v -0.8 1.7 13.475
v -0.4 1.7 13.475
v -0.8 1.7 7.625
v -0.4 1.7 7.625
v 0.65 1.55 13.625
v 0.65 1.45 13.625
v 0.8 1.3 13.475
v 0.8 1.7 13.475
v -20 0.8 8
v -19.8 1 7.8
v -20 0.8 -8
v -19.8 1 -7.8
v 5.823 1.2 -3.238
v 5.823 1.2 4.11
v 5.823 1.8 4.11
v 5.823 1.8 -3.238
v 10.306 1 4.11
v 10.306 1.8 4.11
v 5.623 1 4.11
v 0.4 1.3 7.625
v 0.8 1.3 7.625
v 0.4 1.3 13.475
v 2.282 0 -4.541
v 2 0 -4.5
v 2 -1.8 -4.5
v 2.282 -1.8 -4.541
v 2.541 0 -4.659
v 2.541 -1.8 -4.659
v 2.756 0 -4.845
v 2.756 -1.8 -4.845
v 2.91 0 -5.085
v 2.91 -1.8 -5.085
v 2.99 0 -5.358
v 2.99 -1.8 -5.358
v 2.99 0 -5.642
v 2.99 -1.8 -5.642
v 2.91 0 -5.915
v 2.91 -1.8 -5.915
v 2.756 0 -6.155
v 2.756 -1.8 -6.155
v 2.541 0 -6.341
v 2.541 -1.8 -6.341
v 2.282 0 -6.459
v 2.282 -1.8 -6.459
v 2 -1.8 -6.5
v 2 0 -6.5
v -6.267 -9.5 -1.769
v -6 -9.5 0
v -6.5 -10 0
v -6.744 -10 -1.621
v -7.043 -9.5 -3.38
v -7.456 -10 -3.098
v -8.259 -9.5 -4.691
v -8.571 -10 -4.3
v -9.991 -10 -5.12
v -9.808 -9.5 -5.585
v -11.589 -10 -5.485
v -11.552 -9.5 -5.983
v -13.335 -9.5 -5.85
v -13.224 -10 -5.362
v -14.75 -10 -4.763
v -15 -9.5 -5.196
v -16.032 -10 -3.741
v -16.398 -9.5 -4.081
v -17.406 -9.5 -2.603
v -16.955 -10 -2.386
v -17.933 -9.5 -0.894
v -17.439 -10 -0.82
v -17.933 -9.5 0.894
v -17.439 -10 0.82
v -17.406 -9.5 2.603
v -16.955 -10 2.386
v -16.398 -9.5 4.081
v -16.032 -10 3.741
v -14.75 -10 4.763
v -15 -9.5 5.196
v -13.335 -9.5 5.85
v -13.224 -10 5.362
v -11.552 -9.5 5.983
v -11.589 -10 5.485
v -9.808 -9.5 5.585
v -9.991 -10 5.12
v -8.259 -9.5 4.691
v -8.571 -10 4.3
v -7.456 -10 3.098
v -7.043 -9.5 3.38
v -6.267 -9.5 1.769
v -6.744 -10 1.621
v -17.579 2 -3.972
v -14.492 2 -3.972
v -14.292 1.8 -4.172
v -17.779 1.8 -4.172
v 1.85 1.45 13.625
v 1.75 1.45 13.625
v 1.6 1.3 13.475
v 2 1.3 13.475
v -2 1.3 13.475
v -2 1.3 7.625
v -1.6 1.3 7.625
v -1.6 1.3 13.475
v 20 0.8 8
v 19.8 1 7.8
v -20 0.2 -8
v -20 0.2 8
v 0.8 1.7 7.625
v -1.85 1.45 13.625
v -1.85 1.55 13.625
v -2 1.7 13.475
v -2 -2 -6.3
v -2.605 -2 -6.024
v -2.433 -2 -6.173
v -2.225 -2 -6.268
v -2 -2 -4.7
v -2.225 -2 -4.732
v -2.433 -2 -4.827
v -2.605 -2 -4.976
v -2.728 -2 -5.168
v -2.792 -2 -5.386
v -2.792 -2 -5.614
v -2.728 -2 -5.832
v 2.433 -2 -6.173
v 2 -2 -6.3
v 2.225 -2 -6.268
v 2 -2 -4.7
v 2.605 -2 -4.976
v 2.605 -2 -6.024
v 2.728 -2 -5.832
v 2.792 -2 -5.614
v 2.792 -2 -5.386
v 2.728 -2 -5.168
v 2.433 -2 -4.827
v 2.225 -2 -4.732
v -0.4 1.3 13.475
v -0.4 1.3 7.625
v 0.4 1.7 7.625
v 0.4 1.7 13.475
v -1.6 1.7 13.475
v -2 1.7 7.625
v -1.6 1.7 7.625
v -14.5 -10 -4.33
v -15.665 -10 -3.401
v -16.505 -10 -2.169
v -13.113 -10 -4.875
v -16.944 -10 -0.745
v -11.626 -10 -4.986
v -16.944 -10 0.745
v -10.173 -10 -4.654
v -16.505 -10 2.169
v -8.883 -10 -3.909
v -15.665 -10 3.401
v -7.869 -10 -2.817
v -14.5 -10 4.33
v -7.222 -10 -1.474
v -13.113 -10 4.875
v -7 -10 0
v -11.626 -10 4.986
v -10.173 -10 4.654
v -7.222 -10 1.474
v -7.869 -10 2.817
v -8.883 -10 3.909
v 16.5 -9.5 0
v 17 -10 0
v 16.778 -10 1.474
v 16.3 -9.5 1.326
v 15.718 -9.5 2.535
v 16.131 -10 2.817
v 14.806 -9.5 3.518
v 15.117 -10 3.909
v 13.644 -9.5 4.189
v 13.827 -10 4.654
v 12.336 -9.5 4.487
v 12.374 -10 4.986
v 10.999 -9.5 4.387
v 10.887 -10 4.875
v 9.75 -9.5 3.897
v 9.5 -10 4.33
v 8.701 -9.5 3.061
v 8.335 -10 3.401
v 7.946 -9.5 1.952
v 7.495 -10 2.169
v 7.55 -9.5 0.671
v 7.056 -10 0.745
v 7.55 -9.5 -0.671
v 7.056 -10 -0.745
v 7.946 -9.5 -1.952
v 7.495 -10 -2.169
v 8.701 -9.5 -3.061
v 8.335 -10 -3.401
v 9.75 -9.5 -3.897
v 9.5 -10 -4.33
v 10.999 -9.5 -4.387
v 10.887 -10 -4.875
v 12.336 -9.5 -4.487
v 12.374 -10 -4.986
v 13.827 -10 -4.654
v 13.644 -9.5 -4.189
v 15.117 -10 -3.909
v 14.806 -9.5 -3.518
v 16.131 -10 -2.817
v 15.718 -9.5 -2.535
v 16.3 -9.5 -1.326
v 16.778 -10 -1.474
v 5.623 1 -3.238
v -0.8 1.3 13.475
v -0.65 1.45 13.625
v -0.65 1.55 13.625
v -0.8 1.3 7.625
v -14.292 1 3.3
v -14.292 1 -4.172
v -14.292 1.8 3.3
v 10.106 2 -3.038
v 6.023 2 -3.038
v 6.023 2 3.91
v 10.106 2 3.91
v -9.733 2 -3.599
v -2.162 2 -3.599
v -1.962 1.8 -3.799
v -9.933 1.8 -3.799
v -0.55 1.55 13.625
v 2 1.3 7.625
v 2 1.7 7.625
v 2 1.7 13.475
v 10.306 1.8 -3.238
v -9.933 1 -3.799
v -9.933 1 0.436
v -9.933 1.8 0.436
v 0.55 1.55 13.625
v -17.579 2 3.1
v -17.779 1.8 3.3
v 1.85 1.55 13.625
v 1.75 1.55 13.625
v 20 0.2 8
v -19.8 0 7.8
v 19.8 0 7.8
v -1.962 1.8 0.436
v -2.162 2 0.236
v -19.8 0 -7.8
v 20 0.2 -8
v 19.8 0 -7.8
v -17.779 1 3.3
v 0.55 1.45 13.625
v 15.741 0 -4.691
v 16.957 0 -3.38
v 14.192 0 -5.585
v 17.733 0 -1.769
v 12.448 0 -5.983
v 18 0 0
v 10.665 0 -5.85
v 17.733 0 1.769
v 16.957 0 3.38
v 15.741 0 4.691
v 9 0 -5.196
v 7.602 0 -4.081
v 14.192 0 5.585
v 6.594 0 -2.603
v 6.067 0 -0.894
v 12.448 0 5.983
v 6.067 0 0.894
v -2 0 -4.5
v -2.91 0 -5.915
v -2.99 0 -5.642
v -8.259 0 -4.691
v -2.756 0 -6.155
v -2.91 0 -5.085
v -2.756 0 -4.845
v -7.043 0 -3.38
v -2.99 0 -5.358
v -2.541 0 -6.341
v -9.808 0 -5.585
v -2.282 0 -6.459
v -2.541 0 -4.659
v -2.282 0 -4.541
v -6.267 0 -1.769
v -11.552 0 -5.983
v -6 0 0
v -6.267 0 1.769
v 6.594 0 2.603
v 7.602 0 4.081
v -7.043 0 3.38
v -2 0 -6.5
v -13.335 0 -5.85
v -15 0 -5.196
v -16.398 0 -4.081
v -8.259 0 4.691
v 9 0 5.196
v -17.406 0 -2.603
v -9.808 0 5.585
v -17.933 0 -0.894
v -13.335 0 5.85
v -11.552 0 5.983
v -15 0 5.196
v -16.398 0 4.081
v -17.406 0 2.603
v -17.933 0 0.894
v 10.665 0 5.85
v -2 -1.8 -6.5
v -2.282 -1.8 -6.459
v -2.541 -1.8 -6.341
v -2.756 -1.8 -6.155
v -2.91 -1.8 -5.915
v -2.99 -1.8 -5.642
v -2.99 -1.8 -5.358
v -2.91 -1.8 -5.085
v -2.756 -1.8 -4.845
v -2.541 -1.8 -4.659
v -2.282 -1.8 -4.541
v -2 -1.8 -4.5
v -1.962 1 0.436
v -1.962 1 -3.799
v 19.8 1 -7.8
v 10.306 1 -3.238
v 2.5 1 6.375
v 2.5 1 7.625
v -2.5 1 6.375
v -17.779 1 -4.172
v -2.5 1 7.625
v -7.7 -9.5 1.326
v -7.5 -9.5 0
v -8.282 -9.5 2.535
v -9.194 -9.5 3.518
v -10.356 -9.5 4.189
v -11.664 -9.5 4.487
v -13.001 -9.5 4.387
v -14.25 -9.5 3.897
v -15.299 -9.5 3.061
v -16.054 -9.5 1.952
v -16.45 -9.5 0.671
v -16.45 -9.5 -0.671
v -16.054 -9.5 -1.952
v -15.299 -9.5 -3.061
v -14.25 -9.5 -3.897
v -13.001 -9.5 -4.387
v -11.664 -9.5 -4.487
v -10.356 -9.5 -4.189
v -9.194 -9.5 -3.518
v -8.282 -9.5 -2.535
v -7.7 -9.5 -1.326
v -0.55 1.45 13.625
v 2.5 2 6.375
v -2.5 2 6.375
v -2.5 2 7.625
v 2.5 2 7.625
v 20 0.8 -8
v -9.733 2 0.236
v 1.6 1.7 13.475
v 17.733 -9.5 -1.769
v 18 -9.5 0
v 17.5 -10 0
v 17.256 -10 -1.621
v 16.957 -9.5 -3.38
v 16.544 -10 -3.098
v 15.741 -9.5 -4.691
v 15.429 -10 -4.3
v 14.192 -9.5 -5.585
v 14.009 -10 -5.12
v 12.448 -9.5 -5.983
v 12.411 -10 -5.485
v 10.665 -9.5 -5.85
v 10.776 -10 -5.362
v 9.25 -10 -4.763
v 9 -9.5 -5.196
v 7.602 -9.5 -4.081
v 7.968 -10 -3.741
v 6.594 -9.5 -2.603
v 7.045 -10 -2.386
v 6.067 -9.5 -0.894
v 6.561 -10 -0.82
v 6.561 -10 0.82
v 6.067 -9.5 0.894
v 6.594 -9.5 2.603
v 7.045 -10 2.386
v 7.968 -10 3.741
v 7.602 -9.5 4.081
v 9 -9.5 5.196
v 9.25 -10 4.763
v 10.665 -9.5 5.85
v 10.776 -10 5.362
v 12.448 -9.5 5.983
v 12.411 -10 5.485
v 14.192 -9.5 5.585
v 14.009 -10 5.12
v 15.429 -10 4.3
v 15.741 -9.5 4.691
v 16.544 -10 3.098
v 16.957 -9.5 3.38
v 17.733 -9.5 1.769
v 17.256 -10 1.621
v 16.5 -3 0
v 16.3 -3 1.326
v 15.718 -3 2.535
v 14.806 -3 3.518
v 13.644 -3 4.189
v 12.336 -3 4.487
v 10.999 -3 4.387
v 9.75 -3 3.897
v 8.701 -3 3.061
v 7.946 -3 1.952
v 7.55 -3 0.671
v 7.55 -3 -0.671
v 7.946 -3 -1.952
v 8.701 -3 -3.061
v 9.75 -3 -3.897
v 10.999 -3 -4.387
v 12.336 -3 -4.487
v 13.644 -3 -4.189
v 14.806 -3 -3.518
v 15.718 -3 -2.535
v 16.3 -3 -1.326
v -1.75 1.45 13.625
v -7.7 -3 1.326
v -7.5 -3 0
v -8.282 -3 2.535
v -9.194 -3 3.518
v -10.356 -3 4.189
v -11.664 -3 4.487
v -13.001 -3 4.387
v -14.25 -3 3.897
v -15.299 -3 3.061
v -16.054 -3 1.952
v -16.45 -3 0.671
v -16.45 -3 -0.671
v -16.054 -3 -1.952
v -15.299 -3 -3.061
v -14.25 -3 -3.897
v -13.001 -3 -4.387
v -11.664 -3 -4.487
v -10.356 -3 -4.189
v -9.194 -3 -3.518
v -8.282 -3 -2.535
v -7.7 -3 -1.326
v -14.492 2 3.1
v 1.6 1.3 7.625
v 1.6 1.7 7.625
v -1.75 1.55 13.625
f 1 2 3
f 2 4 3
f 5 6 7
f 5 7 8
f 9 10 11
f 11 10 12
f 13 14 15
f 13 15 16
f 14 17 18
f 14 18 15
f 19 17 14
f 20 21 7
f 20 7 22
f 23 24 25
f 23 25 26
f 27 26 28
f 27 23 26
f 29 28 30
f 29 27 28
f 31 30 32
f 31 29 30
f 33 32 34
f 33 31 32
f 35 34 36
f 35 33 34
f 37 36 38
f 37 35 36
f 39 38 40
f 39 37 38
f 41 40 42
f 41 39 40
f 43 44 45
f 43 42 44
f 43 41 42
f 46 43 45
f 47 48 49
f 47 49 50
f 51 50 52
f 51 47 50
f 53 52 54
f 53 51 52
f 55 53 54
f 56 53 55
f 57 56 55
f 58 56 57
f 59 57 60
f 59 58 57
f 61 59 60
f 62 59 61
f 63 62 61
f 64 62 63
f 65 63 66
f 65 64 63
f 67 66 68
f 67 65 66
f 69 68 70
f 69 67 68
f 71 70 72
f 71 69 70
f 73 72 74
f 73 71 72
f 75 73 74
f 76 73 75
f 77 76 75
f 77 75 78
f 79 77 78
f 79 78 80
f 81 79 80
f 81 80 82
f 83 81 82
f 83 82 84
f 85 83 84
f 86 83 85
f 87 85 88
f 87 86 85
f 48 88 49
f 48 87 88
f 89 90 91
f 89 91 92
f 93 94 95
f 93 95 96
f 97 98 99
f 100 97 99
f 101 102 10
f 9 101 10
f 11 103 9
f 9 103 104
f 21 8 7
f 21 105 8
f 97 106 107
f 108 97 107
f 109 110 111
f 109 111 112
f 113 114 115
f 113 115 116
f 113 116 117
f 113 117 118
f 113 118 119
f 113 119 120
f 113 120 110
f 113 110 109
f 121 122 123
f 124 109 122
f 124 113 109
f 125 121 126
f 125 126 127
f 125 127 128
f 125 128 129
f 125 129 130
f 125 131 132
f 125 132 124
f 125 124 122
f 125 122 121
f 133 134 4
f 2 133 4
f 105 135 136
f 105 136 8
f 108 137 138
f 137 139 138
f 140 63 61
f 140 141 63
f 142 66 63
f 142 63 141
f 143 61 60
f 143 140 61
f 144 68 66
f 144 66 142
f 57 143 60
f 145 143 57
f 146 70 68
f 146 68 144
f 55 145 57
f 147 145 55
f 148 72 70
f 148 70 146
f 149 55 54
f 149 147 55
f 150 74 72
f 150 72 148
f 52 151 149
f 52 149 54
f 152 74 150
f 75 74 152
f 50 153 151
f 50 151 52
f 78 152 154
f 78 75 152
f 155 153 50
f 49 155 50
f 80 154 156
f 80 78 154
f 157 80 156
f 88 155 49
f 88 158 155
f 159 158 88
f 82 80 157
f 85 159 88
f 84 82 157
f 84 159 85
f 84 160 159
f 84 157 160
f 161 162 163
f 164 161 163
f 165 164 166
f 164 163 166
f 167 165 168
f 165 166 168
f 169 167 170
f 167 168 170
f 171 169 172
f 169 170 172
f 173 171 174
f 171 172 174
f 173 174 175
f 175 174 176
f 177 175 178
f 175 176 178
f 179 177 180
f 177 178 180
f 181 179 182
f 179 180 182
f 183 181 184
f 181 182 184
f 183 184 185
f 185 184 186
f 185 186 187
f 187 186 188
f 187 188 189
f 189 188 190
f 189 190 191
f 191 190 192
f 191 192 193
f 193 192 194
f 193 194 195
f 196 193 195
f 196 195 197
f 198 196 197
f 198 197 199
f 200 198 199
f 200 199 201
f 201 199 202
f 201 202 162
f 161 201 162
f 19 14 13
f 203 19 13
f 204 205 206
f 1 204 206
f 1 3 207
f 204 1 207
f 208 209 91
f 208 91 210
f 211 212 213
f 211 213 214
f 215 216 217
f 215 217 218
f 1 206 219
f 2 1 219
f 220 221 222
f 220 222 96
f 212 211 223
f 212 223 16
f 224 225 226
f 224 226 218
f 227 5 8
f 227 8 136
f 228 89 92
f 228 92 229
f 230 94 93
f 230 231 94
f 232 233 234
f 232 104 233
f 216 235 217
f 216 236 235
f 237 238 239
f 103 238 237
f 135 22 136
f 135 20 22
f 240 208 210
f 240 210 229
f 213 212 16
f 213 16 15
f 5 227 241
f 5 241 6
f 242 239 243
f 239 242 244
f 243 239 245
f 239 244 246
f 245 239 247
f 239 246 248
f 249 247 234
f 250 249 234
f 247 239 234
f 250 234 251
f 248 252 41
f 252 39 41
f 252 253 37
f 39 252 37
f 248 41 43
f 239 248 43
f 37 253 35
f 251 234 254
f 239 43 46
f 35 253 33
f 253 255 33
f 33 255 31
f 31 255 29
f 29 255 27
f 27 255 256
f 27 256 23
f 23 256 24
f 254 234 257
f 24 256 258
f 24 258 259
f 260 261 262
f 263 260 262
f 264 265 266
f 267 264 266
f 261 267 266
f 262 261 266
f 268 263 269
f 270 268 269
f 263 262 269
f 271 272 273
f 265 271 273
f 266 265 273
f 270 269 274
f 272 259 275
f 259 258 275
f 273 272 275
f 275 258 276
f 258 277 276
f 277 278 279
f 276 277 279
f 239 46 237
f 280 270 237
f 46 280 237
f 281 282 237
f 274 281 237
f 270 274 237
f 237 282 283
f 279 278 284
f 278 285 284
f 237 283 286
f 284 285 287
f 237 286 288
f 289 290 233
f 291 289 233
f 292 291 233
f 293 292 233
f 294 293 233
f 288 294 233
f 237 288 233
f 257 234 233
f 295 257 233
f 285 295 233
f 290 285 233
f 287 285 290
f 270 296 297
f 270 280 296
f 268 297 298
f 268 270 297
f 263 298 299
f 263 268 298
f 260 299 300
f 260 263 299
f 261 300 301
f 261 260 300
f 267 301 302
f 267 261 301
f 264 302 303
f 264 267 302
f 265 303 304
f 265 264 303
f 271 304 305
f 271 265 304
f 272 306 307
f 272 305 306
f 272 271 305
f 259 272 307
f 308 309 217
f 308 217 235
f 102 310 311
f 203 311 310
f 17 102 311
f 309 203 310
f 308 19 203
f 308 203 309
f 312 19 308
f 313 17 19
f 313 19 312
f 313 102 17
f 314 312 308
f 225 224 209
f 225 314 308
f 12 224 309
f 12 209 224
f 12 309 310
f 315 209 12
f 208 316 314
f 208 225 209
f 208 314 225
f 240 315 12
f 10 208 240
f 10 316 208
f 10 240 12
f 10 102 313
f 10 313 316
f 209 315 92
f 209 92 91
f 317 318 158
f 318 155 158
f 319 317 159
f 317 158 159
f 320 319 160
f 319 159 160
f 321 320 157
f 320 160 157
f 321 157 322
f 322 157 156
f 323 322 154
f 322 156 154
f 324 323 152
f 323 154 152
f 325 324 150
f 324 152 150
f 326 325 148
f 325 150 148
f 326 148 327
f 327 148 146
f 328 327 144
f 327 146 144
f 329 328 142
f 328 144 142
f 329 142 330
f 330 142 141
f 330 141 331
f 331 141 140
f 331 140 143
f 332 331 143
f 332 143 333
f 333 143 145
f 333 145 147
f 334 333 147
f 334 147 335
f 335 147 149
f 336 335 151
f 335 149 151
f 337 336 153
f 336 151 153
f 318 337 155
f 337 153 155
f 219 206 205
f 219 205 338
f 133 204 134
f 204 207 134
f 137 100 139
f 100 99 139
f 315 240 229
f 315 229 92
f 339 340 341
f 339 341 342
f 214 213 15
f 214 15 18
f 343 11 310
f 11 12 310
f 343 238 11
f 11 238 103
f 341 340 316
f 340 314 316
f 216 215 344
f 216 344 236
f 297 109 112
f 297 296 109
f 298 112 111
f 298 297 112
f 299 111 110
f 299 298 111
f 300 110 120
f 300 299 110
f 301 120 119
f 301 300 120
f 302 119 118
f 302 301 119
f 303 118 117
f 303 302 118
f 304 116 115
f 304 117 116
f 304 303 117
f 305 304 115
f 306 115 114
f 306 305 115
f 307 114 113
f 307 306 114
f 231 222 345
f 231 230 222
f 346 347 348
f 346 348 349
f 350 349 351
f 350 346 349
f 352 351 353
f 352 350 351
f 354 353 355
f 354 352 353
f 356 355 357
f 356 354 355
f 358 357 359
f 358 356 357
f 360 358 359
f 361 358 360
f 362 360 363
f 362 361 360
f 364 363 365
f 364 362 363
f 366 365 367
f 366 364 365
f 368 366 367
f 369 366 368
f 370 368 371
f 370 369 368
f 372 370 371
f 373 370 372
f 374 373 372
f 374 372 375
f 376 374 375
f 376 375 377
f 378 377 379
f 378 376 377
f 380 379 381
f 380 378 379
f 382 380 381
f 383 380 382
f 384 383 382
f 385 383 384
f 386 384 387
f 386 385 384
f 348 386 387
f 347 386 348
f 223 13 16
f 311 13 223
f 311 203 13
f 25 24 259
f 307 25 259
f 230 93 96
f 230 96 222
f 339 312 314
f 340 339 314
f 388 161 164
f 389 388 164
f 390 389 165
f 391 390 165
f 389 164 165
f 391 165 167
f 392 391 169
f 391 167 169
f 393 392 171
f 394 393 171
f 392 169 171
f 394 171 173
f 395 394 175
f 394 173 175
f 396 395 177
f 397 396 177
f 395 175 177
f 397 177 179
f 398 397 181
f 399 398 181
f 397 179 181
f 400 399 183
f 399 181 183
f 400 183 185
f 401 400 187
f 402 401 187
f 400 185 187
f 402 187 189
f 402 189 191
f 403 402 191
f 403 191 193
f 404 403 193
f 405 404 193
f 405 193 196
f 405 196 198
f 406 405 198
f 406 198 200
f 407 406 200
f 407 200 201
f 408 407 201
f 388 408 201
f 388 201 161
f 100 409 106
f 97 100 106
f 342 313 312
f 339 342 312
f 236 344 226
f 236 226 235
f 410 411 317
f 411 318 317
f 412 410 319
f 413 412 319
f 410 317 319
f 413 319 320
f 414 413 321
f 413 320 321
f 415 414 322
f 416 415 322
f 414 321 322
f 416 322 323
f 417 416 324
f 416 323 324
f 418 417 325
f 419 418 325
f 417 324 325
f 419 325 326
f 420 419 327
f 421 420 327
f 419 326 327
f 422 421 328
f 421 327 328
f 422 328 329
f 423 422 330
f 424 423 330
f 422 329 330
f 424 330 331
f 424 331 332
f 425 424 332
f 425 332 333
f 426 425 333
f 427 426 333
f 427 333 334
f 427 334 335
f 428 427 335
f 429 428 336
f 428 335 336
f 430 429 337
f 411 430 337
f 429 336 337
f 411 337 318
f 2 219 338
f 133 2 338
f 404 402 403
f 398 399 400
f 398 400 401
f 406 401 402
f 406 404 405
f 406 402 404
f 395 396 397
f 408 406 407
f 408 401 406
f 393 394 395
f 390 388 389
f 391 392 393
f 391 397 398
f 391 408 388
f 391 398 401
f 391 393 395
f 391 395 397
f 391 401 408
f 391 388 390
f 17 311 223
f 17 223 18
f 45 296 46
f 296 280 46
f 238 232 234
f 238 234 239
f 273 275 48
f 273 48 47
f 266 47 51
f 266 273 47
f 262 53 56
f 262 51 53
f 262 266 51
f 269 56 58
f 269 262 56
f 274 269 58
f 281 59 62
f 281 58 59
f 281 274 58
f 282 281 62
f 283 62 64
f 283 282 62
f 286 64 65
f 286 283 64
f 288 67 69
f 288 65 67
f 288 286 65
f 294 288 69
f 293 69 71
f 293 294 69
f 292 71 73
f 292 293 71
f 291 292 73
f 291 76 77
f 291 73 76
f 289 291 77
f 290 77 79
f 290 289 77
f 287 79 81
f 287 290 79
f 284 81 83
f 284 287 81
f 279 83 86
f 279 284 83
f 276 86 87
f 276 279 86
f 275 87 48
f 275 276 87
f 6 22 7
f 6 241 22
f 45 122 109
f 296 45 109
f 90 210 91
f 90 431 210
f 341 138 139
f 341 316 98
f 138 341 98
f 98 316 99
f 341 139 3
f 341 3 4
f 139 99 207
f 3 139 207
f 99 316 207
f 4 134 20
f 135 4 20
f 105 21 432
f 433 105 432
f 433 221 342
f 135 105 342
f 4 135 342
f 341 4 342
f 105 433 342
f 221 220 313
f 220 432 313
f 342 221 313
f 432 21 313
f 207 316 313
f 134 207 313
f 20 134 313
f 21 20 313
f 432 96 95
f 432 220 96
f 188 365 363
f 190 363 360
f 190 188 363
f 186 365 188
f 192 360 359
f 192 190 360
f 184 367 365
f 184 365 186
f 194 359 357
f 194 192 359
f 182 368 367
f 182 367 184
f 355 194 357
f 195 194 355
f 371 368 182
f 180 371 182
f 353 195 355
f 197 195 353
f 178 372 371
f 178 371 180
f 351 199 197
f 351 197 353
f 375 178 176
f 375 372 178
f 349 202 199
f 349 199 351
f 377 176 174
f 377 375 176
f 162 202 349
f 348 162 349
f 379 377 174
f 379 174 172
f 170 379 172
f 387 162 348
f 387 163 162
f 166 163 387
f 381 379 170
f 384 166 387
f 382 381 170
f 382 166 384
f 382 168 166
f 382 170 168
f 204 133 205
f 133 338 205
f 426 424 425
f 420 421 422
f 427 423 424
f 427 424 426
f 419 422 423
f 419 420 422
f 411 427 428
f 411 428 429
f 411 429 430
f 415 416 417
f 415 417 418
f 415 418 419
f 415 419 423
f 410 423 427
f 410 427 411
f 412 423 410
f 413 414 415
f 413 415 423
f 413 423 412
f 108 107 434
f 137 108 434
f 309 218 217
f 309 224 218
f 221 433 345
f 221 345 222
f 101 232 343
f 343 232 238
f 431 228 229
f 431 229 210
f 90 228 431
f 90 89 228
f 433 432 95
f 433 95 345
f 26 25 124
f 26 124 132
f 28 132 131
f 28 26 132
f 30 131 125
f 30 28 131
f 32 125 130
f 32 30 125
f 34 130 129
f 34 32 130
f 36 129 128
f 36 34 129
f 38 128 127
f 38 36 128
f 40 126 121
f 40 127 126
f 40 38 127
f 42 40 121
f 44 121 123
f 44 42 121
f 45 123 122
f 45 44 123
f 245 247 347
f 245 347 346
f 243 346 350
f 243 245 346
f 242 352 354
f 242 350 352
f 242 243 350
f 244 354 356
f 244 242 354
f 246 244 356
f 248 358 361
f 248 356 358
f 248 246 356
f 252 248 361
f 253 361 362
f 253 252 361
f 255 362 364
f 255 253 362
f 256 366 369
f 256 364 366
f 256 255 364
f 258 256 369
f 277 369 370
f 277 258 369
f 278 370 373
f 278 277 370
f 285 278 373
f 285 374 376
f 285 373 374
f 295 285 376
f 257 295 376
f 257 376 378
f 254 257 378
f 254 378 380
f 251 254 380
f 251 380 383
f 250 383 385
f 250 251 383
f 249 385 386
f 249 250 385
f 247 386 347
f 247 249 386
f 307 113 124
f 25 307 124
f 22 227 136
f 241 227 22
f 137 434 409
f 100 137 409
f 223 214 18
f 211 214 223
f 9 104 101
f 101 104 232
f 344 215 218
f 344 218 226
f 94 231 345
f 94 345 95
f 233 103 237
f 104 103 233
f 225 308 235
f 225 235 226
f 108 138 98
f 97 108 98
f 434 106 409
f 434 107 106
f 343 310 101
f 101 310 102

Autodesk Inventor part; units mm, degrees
ref_plane "YZ Plane" through (0, 0, 0) normal (1, 0, 0) x (0, 1, 0)
ref_plane "XZ Plane" through (0, 0, 0) normal (0, 1, 0) x (-1, 0, 0)
ref_plane "XY Plane" through (0, 0, 0) normal (0, 0, 1) x (1, 0, 0)
sketch "Szkic1" plane through (0, 0, 0) normal (0, 1, 0) x (-1, 0, 0)
  line L0 (-20, -8) -> (20, -8)
  line L1 (20, -8) -> (20, 8)
  line L2 (20, 8) -> (-20, 8)
  line L3 (-20, 8) -> (-20, -8)
  line L4 (-20, -8) -> (20, 8) construction
  line L5 (20, -8) -> (-20, 8) construction
  point P0 (0, 0)
  dimension "d0" = 40
  dimension "d1" = 16
extrude "Wyciągnięcie proste1" add sketch "Szkic1" along normal blind 1
sketch "Szkic2" plane through (0, 0, 0) normal (0, -1, 0) x (1, 0, 0)
  circle A0 centre (-12, 0) radius 6
  circle A1 centre (12, 0) radius 6
  point P0 (0, 0)
  dimension "d4" = 12
  dimension "d5" = 12
extrude "Wyciągnięcie proste2" add sketch "Szkic2" along normal blind 10
sketch "Szkic3" plane through (0, 0, 0) normal (0, -1, 0) x (1, 0, 0)
  line L0 (20, -8) -> (-20, -8) projected
  line L1 (2, -5.5) -> (-2, -5.5) construction
  line L2 (2, -4.5) -> (-2, -4.5)
  line L3 (-2, -6.5) -> (2, -6.5)
  arc A0 (2, -6.5) -> (2, -4.5) centre (2, -5.5) ccw
  arc A1 (-2, -4.5) -> (-2, -6.5) centre (-2, -5.5) ccw
  point P0 (0, 0)
  point P1 (0, -5.5)
  dimension "d8" = 4
  dimension "d9" = 2
extrude "Wyciągnięcie proste3" add sketch "Szkic3" along normal blind 2
chamfer "Faza1" distance 0.5 angle 45 1 edges at (-18, -10, 0)
chamfer "Faza2" distance 0.5 angle 45 1 edges at (6, -10, 0)
chamfer "Faza3" distance 0.2 angle 45 4 edges at (0, -2, -6.5) (3, -2, -5.5) (0, -2, -4.5) (-3, -2, -5.5)
chamfer "Faza4" distance 0.2 angle 45 1 edges at (0, 0, 8)
chamfer "Faza5" distance 0.2 angle 45 1 edges at (-20, 0, -0.1)
chamfer "Faza6" distance 0.2 angle 45 1 edges at (0.1, 0, -8)
chamfer "Faza7" distance 0.2 angle 45 1 edges at (20, 0, 0)
chamfer "Faza8" distance 0.2 angle 45 1 edges at (0, 1, 8)
chamfer "Faza9" distance 0.2 angle 45 1 edges at (20, 1, -0.1)
chamfer "Faza10" distance 0.2 angle 45 1 edges at (-0.1, 1, -8)
chamfer "Faza11" distance 0.2 angle 45 1 edges at (-20, 1, 0)
sketch "Szkic4" plane through (0, 1, 0) normal (0, 1, 0) x (1, 0, 0)
  line L0 (-17.7792, 4.1723) -> (-14.2918, 4.1723)
  line L1 (-14.2918, 4.1723) -> (-14.2918, -3.3005)
  line L2 (-14.2918, -3.3005) -> (-17.7792, -3.3005)
  line L3 (-17.7792, -3.3005) -> (-17.7792, 4.1723)
  line L4 (-17.7792, 4.1723) -> (-14.2918, -3.3005) construction
  line L5 (-14.2918, 4.1723) -> (-17.7792, -3.3005) construction
  line L6 (-9.9327, 3.7987) -> (-1.9616, 3.7987)
  line L7 (-1.9616, 3.7987) -> (-1.9616, -0.4359)
  line L8 (-1.9616, -0.4359) -> (-9.9327, -0.4359)
  line L9 (-9.9327, -0.4359) -> (-9.9327, 3.7987)
  line L10 (-9.9327, 3.7987) -> (-1.9616, -0.4359) construction
  line L11 (-1.9616, 3.7987) -> (-9.9327, -0.4359) construction
  line L12 (10.3063, -4.1101) -> (5.8226, -4.1101)
  line L13 (5.8226, -4.1101) -> (5.8226, 3.2382)
  line L14 (5.8226, 3.2382) -> (10.3063, 3.2382)
  line L15 (10.3063, 3.2382) -> (10.3063, -4.1101)
  line L16 (10.3063, -4.1101) -> (5.8226, 3.2382) construction
  line L17 (5.8226, -4.1101) -> (10.3063, 3.2382) construction
  point P0 (0, 0)
  point P1 (-16.0355, 0.4359)
  point P2 (-5.9471, 1.6814)
  point P3 (8.0645, -0.4359)
extrude "Wyciągnięcie proste4" add sketch "Szkic4" along normal blind 1
chamfer "Faza12" distance 0.2 angle 45 13 edges at (-5.9471, 2, 0.4359) (-1.9616, 2, -1.6814) (-5.9471, 2, -3.7987) (-9.9327, 2, -1.6814) (-14.2918, 2, -0.4359) (-16.0355, 2, 3.3005) (-17.7792, 2, -0.4359) (-16.0355, 2, -4.1723) (8.0645, 2, 4.1101) (5.8226, 1, 0.4359) (10.3063, 2, 0.4359) (8.0645, 2, -3.2382) (5.8226, 2, 0.4359)
sketch "Szkic5" plane through (-12, -10, 0) normal (0, -1, 0) x (1, 0, 0)
  circle A0 centre (0, 0) radius 5.5 projected
  circle A1 centre (24, 0) radius 5.5 projected
  point P0 (12, 0)
sketch "Szkic6" plane through (-12, -10, 0) normal (0, -1, 0) x (1, 0, 0)
  circle A0 centre (0, 0) radius 5.5 projected
  circle A1 centre (0, 0) radius 4.5
  point P0 (12, 0)
  dimension "d50" = 9
extrude "Wyciągnięcie proste5" cut sketch "Szkic6" against normal blind 7 contours A1
chamfer "Faza13" distance 0.5 angle 45 1 edges at (-16.5, -10, 0)
sketch "Szkic7" plane through (12, -10, 0) normal (0, -1, 0) x (1, 0, 0)
  circle A0 centre (0, 0) radius 5.5 projected
  circle A1 centre (0, 0) radius 4.5
  point P0 (-12, 0)
  dimension "d56" = 9
extrude "Wyciągnięcie proste6" cut sketch "Szkic7" against normal blind 7 contours A1
chamfer "Faza14" distance 0.5 angle 45 1 edges at (7.5, -10, 0)
sketch "Szkic8" plane through (0, 1, 0) normal (0, 1, 0) x (1, 0, 0)
  line L0 (-2.5, -7.625) -> (2.5, -7.625)
  line L1 (2.5, -7.625) -> (2.5, -6.375)
  line L2 (2.5, -6.375) -> (-2.5, -6.375)
  line L3 (-2.5, -6.375) -> (-2.5, -7.625)
  line L4 (-2.5, -7.625) -> (2.5, -6.375) construction
  line L5 (2.5, -7.625) -> (-2.5, -6.375) construction
  point P0 (0, 0)
  point P1 (0, -7)
  dimension "d62" = 5
  dimension "d63" = 1.25
extrude "Wyciągnięcie proste7" add sketch "Szkic8" along normal blind 1
sketch "Szkic9" plane through (-2.5, 1, 7.625) normal (0, 0, 1) x (1, 0, 0)
  line L0 (0.9, 0.7) -> (0.5, 0.7)
  line L1 (0.5, 0.7) -> (0.5, 0.3)
  line L2 (0.5, 0.3) -> (0.9, 0.3)
  line L3 (0.9, 0.3) -> (0.9, 0.7)
  line L4 (0.9, 0.7) -> (0.5, 0.3) construction
  line L5 (0.5, 0.7) -> (0.9, 0.3) construction
  line L6 (4.1, 0.7) -> (4.5, 0.7)
  line L7 (4.5, 0.7) -> (4.5, 0.3)
  line L8 (4.5, 0.3) -> (4.1, 0.3)
  line L9 (4.1, 0.3) -> (4.1, 0.7)
  line L10 (4.1, 0.7) -> (4.5, 0.3) construction
  line L11 (4.5, 0.7) -> (4.1, 0.3) construction
  line L12 (2.1, 0.7) -> (1.7, 0.7)
  line L13 (1.7, 0.7) -> (1.7, 0.3)
  line L14 (1.7, 0.3) -> (2.1, 0.3)
  line L15 (2.1, 0.3) -> (2.1, 0.7)
  line L16 (2.1, 0.7) -> (1.7, 0.3) construction
  line L17 (1.7, 0.7) -> (2.1, 0.3) construction
  line L18 (2.9, 0.7) -> (3.3, 0.7)
  line L19 (3.3, 0.7) -> (3.3, 0.3)
  line L20 (3.3, 0.3) -> (2.9, 0.3)
  line L21 (2.9, 0.3) -> (2.9, 0.7)
  line L22 (2.9, 0.7) -> (3.3, 0.3) construction
  line L23 (3.3, 0.7) -> (2.9, 0.3) construction
  point P0 (2.5, -1)
  point P1 (0.7, 0.5)
  point P2 (4.3, 0.5)
  point P3 (1.9, 0.5)
  point P4 (3.1, 0.5)
  dimension "d66" = 0.4
  dimension "d67" = 0.4
  dimension "d68" = 0.4
  dimension "d69" = 0.4
  dimension "d70" = 0.4
  dimension "d71" = 0.4
  dimension "d72" = 0.4
  dimension "d73" = 0.4
extrude "Wyciągnięcie proste8" add sketch "Szkic9" along normal blind 6
chamfer "Faza15" distance 0.15 angle 45 4 edges at (-2, 1.5, 13.625) (-1.8, 1.3, 13.625) (-1.6, 1.5, 13.625) (-1.8, 1.7, 13.625)
chamfer "Faza16" distance 0.15 angle 45 12 edges at (-0.6, 1.7, 13.625) (-0.8, 1.5, 13.625) (-0.6, 1.3, 13.625) (-0.4, 1.5, 13.625) (0.6, 1.3, 13.625) (0.8, 1.5, 13.625) (0.6, 1.7, 13.625) (0.4, 1.5, 13.625) (1.6, 1.5, 13.625) (1.8, 1.3, 13.625) (2, 1.5, 13.625) (1.8, 1.7, 13.625)
properties part number "czujnik_ultra_dzwiek" material "Kauczuk, silikon"
